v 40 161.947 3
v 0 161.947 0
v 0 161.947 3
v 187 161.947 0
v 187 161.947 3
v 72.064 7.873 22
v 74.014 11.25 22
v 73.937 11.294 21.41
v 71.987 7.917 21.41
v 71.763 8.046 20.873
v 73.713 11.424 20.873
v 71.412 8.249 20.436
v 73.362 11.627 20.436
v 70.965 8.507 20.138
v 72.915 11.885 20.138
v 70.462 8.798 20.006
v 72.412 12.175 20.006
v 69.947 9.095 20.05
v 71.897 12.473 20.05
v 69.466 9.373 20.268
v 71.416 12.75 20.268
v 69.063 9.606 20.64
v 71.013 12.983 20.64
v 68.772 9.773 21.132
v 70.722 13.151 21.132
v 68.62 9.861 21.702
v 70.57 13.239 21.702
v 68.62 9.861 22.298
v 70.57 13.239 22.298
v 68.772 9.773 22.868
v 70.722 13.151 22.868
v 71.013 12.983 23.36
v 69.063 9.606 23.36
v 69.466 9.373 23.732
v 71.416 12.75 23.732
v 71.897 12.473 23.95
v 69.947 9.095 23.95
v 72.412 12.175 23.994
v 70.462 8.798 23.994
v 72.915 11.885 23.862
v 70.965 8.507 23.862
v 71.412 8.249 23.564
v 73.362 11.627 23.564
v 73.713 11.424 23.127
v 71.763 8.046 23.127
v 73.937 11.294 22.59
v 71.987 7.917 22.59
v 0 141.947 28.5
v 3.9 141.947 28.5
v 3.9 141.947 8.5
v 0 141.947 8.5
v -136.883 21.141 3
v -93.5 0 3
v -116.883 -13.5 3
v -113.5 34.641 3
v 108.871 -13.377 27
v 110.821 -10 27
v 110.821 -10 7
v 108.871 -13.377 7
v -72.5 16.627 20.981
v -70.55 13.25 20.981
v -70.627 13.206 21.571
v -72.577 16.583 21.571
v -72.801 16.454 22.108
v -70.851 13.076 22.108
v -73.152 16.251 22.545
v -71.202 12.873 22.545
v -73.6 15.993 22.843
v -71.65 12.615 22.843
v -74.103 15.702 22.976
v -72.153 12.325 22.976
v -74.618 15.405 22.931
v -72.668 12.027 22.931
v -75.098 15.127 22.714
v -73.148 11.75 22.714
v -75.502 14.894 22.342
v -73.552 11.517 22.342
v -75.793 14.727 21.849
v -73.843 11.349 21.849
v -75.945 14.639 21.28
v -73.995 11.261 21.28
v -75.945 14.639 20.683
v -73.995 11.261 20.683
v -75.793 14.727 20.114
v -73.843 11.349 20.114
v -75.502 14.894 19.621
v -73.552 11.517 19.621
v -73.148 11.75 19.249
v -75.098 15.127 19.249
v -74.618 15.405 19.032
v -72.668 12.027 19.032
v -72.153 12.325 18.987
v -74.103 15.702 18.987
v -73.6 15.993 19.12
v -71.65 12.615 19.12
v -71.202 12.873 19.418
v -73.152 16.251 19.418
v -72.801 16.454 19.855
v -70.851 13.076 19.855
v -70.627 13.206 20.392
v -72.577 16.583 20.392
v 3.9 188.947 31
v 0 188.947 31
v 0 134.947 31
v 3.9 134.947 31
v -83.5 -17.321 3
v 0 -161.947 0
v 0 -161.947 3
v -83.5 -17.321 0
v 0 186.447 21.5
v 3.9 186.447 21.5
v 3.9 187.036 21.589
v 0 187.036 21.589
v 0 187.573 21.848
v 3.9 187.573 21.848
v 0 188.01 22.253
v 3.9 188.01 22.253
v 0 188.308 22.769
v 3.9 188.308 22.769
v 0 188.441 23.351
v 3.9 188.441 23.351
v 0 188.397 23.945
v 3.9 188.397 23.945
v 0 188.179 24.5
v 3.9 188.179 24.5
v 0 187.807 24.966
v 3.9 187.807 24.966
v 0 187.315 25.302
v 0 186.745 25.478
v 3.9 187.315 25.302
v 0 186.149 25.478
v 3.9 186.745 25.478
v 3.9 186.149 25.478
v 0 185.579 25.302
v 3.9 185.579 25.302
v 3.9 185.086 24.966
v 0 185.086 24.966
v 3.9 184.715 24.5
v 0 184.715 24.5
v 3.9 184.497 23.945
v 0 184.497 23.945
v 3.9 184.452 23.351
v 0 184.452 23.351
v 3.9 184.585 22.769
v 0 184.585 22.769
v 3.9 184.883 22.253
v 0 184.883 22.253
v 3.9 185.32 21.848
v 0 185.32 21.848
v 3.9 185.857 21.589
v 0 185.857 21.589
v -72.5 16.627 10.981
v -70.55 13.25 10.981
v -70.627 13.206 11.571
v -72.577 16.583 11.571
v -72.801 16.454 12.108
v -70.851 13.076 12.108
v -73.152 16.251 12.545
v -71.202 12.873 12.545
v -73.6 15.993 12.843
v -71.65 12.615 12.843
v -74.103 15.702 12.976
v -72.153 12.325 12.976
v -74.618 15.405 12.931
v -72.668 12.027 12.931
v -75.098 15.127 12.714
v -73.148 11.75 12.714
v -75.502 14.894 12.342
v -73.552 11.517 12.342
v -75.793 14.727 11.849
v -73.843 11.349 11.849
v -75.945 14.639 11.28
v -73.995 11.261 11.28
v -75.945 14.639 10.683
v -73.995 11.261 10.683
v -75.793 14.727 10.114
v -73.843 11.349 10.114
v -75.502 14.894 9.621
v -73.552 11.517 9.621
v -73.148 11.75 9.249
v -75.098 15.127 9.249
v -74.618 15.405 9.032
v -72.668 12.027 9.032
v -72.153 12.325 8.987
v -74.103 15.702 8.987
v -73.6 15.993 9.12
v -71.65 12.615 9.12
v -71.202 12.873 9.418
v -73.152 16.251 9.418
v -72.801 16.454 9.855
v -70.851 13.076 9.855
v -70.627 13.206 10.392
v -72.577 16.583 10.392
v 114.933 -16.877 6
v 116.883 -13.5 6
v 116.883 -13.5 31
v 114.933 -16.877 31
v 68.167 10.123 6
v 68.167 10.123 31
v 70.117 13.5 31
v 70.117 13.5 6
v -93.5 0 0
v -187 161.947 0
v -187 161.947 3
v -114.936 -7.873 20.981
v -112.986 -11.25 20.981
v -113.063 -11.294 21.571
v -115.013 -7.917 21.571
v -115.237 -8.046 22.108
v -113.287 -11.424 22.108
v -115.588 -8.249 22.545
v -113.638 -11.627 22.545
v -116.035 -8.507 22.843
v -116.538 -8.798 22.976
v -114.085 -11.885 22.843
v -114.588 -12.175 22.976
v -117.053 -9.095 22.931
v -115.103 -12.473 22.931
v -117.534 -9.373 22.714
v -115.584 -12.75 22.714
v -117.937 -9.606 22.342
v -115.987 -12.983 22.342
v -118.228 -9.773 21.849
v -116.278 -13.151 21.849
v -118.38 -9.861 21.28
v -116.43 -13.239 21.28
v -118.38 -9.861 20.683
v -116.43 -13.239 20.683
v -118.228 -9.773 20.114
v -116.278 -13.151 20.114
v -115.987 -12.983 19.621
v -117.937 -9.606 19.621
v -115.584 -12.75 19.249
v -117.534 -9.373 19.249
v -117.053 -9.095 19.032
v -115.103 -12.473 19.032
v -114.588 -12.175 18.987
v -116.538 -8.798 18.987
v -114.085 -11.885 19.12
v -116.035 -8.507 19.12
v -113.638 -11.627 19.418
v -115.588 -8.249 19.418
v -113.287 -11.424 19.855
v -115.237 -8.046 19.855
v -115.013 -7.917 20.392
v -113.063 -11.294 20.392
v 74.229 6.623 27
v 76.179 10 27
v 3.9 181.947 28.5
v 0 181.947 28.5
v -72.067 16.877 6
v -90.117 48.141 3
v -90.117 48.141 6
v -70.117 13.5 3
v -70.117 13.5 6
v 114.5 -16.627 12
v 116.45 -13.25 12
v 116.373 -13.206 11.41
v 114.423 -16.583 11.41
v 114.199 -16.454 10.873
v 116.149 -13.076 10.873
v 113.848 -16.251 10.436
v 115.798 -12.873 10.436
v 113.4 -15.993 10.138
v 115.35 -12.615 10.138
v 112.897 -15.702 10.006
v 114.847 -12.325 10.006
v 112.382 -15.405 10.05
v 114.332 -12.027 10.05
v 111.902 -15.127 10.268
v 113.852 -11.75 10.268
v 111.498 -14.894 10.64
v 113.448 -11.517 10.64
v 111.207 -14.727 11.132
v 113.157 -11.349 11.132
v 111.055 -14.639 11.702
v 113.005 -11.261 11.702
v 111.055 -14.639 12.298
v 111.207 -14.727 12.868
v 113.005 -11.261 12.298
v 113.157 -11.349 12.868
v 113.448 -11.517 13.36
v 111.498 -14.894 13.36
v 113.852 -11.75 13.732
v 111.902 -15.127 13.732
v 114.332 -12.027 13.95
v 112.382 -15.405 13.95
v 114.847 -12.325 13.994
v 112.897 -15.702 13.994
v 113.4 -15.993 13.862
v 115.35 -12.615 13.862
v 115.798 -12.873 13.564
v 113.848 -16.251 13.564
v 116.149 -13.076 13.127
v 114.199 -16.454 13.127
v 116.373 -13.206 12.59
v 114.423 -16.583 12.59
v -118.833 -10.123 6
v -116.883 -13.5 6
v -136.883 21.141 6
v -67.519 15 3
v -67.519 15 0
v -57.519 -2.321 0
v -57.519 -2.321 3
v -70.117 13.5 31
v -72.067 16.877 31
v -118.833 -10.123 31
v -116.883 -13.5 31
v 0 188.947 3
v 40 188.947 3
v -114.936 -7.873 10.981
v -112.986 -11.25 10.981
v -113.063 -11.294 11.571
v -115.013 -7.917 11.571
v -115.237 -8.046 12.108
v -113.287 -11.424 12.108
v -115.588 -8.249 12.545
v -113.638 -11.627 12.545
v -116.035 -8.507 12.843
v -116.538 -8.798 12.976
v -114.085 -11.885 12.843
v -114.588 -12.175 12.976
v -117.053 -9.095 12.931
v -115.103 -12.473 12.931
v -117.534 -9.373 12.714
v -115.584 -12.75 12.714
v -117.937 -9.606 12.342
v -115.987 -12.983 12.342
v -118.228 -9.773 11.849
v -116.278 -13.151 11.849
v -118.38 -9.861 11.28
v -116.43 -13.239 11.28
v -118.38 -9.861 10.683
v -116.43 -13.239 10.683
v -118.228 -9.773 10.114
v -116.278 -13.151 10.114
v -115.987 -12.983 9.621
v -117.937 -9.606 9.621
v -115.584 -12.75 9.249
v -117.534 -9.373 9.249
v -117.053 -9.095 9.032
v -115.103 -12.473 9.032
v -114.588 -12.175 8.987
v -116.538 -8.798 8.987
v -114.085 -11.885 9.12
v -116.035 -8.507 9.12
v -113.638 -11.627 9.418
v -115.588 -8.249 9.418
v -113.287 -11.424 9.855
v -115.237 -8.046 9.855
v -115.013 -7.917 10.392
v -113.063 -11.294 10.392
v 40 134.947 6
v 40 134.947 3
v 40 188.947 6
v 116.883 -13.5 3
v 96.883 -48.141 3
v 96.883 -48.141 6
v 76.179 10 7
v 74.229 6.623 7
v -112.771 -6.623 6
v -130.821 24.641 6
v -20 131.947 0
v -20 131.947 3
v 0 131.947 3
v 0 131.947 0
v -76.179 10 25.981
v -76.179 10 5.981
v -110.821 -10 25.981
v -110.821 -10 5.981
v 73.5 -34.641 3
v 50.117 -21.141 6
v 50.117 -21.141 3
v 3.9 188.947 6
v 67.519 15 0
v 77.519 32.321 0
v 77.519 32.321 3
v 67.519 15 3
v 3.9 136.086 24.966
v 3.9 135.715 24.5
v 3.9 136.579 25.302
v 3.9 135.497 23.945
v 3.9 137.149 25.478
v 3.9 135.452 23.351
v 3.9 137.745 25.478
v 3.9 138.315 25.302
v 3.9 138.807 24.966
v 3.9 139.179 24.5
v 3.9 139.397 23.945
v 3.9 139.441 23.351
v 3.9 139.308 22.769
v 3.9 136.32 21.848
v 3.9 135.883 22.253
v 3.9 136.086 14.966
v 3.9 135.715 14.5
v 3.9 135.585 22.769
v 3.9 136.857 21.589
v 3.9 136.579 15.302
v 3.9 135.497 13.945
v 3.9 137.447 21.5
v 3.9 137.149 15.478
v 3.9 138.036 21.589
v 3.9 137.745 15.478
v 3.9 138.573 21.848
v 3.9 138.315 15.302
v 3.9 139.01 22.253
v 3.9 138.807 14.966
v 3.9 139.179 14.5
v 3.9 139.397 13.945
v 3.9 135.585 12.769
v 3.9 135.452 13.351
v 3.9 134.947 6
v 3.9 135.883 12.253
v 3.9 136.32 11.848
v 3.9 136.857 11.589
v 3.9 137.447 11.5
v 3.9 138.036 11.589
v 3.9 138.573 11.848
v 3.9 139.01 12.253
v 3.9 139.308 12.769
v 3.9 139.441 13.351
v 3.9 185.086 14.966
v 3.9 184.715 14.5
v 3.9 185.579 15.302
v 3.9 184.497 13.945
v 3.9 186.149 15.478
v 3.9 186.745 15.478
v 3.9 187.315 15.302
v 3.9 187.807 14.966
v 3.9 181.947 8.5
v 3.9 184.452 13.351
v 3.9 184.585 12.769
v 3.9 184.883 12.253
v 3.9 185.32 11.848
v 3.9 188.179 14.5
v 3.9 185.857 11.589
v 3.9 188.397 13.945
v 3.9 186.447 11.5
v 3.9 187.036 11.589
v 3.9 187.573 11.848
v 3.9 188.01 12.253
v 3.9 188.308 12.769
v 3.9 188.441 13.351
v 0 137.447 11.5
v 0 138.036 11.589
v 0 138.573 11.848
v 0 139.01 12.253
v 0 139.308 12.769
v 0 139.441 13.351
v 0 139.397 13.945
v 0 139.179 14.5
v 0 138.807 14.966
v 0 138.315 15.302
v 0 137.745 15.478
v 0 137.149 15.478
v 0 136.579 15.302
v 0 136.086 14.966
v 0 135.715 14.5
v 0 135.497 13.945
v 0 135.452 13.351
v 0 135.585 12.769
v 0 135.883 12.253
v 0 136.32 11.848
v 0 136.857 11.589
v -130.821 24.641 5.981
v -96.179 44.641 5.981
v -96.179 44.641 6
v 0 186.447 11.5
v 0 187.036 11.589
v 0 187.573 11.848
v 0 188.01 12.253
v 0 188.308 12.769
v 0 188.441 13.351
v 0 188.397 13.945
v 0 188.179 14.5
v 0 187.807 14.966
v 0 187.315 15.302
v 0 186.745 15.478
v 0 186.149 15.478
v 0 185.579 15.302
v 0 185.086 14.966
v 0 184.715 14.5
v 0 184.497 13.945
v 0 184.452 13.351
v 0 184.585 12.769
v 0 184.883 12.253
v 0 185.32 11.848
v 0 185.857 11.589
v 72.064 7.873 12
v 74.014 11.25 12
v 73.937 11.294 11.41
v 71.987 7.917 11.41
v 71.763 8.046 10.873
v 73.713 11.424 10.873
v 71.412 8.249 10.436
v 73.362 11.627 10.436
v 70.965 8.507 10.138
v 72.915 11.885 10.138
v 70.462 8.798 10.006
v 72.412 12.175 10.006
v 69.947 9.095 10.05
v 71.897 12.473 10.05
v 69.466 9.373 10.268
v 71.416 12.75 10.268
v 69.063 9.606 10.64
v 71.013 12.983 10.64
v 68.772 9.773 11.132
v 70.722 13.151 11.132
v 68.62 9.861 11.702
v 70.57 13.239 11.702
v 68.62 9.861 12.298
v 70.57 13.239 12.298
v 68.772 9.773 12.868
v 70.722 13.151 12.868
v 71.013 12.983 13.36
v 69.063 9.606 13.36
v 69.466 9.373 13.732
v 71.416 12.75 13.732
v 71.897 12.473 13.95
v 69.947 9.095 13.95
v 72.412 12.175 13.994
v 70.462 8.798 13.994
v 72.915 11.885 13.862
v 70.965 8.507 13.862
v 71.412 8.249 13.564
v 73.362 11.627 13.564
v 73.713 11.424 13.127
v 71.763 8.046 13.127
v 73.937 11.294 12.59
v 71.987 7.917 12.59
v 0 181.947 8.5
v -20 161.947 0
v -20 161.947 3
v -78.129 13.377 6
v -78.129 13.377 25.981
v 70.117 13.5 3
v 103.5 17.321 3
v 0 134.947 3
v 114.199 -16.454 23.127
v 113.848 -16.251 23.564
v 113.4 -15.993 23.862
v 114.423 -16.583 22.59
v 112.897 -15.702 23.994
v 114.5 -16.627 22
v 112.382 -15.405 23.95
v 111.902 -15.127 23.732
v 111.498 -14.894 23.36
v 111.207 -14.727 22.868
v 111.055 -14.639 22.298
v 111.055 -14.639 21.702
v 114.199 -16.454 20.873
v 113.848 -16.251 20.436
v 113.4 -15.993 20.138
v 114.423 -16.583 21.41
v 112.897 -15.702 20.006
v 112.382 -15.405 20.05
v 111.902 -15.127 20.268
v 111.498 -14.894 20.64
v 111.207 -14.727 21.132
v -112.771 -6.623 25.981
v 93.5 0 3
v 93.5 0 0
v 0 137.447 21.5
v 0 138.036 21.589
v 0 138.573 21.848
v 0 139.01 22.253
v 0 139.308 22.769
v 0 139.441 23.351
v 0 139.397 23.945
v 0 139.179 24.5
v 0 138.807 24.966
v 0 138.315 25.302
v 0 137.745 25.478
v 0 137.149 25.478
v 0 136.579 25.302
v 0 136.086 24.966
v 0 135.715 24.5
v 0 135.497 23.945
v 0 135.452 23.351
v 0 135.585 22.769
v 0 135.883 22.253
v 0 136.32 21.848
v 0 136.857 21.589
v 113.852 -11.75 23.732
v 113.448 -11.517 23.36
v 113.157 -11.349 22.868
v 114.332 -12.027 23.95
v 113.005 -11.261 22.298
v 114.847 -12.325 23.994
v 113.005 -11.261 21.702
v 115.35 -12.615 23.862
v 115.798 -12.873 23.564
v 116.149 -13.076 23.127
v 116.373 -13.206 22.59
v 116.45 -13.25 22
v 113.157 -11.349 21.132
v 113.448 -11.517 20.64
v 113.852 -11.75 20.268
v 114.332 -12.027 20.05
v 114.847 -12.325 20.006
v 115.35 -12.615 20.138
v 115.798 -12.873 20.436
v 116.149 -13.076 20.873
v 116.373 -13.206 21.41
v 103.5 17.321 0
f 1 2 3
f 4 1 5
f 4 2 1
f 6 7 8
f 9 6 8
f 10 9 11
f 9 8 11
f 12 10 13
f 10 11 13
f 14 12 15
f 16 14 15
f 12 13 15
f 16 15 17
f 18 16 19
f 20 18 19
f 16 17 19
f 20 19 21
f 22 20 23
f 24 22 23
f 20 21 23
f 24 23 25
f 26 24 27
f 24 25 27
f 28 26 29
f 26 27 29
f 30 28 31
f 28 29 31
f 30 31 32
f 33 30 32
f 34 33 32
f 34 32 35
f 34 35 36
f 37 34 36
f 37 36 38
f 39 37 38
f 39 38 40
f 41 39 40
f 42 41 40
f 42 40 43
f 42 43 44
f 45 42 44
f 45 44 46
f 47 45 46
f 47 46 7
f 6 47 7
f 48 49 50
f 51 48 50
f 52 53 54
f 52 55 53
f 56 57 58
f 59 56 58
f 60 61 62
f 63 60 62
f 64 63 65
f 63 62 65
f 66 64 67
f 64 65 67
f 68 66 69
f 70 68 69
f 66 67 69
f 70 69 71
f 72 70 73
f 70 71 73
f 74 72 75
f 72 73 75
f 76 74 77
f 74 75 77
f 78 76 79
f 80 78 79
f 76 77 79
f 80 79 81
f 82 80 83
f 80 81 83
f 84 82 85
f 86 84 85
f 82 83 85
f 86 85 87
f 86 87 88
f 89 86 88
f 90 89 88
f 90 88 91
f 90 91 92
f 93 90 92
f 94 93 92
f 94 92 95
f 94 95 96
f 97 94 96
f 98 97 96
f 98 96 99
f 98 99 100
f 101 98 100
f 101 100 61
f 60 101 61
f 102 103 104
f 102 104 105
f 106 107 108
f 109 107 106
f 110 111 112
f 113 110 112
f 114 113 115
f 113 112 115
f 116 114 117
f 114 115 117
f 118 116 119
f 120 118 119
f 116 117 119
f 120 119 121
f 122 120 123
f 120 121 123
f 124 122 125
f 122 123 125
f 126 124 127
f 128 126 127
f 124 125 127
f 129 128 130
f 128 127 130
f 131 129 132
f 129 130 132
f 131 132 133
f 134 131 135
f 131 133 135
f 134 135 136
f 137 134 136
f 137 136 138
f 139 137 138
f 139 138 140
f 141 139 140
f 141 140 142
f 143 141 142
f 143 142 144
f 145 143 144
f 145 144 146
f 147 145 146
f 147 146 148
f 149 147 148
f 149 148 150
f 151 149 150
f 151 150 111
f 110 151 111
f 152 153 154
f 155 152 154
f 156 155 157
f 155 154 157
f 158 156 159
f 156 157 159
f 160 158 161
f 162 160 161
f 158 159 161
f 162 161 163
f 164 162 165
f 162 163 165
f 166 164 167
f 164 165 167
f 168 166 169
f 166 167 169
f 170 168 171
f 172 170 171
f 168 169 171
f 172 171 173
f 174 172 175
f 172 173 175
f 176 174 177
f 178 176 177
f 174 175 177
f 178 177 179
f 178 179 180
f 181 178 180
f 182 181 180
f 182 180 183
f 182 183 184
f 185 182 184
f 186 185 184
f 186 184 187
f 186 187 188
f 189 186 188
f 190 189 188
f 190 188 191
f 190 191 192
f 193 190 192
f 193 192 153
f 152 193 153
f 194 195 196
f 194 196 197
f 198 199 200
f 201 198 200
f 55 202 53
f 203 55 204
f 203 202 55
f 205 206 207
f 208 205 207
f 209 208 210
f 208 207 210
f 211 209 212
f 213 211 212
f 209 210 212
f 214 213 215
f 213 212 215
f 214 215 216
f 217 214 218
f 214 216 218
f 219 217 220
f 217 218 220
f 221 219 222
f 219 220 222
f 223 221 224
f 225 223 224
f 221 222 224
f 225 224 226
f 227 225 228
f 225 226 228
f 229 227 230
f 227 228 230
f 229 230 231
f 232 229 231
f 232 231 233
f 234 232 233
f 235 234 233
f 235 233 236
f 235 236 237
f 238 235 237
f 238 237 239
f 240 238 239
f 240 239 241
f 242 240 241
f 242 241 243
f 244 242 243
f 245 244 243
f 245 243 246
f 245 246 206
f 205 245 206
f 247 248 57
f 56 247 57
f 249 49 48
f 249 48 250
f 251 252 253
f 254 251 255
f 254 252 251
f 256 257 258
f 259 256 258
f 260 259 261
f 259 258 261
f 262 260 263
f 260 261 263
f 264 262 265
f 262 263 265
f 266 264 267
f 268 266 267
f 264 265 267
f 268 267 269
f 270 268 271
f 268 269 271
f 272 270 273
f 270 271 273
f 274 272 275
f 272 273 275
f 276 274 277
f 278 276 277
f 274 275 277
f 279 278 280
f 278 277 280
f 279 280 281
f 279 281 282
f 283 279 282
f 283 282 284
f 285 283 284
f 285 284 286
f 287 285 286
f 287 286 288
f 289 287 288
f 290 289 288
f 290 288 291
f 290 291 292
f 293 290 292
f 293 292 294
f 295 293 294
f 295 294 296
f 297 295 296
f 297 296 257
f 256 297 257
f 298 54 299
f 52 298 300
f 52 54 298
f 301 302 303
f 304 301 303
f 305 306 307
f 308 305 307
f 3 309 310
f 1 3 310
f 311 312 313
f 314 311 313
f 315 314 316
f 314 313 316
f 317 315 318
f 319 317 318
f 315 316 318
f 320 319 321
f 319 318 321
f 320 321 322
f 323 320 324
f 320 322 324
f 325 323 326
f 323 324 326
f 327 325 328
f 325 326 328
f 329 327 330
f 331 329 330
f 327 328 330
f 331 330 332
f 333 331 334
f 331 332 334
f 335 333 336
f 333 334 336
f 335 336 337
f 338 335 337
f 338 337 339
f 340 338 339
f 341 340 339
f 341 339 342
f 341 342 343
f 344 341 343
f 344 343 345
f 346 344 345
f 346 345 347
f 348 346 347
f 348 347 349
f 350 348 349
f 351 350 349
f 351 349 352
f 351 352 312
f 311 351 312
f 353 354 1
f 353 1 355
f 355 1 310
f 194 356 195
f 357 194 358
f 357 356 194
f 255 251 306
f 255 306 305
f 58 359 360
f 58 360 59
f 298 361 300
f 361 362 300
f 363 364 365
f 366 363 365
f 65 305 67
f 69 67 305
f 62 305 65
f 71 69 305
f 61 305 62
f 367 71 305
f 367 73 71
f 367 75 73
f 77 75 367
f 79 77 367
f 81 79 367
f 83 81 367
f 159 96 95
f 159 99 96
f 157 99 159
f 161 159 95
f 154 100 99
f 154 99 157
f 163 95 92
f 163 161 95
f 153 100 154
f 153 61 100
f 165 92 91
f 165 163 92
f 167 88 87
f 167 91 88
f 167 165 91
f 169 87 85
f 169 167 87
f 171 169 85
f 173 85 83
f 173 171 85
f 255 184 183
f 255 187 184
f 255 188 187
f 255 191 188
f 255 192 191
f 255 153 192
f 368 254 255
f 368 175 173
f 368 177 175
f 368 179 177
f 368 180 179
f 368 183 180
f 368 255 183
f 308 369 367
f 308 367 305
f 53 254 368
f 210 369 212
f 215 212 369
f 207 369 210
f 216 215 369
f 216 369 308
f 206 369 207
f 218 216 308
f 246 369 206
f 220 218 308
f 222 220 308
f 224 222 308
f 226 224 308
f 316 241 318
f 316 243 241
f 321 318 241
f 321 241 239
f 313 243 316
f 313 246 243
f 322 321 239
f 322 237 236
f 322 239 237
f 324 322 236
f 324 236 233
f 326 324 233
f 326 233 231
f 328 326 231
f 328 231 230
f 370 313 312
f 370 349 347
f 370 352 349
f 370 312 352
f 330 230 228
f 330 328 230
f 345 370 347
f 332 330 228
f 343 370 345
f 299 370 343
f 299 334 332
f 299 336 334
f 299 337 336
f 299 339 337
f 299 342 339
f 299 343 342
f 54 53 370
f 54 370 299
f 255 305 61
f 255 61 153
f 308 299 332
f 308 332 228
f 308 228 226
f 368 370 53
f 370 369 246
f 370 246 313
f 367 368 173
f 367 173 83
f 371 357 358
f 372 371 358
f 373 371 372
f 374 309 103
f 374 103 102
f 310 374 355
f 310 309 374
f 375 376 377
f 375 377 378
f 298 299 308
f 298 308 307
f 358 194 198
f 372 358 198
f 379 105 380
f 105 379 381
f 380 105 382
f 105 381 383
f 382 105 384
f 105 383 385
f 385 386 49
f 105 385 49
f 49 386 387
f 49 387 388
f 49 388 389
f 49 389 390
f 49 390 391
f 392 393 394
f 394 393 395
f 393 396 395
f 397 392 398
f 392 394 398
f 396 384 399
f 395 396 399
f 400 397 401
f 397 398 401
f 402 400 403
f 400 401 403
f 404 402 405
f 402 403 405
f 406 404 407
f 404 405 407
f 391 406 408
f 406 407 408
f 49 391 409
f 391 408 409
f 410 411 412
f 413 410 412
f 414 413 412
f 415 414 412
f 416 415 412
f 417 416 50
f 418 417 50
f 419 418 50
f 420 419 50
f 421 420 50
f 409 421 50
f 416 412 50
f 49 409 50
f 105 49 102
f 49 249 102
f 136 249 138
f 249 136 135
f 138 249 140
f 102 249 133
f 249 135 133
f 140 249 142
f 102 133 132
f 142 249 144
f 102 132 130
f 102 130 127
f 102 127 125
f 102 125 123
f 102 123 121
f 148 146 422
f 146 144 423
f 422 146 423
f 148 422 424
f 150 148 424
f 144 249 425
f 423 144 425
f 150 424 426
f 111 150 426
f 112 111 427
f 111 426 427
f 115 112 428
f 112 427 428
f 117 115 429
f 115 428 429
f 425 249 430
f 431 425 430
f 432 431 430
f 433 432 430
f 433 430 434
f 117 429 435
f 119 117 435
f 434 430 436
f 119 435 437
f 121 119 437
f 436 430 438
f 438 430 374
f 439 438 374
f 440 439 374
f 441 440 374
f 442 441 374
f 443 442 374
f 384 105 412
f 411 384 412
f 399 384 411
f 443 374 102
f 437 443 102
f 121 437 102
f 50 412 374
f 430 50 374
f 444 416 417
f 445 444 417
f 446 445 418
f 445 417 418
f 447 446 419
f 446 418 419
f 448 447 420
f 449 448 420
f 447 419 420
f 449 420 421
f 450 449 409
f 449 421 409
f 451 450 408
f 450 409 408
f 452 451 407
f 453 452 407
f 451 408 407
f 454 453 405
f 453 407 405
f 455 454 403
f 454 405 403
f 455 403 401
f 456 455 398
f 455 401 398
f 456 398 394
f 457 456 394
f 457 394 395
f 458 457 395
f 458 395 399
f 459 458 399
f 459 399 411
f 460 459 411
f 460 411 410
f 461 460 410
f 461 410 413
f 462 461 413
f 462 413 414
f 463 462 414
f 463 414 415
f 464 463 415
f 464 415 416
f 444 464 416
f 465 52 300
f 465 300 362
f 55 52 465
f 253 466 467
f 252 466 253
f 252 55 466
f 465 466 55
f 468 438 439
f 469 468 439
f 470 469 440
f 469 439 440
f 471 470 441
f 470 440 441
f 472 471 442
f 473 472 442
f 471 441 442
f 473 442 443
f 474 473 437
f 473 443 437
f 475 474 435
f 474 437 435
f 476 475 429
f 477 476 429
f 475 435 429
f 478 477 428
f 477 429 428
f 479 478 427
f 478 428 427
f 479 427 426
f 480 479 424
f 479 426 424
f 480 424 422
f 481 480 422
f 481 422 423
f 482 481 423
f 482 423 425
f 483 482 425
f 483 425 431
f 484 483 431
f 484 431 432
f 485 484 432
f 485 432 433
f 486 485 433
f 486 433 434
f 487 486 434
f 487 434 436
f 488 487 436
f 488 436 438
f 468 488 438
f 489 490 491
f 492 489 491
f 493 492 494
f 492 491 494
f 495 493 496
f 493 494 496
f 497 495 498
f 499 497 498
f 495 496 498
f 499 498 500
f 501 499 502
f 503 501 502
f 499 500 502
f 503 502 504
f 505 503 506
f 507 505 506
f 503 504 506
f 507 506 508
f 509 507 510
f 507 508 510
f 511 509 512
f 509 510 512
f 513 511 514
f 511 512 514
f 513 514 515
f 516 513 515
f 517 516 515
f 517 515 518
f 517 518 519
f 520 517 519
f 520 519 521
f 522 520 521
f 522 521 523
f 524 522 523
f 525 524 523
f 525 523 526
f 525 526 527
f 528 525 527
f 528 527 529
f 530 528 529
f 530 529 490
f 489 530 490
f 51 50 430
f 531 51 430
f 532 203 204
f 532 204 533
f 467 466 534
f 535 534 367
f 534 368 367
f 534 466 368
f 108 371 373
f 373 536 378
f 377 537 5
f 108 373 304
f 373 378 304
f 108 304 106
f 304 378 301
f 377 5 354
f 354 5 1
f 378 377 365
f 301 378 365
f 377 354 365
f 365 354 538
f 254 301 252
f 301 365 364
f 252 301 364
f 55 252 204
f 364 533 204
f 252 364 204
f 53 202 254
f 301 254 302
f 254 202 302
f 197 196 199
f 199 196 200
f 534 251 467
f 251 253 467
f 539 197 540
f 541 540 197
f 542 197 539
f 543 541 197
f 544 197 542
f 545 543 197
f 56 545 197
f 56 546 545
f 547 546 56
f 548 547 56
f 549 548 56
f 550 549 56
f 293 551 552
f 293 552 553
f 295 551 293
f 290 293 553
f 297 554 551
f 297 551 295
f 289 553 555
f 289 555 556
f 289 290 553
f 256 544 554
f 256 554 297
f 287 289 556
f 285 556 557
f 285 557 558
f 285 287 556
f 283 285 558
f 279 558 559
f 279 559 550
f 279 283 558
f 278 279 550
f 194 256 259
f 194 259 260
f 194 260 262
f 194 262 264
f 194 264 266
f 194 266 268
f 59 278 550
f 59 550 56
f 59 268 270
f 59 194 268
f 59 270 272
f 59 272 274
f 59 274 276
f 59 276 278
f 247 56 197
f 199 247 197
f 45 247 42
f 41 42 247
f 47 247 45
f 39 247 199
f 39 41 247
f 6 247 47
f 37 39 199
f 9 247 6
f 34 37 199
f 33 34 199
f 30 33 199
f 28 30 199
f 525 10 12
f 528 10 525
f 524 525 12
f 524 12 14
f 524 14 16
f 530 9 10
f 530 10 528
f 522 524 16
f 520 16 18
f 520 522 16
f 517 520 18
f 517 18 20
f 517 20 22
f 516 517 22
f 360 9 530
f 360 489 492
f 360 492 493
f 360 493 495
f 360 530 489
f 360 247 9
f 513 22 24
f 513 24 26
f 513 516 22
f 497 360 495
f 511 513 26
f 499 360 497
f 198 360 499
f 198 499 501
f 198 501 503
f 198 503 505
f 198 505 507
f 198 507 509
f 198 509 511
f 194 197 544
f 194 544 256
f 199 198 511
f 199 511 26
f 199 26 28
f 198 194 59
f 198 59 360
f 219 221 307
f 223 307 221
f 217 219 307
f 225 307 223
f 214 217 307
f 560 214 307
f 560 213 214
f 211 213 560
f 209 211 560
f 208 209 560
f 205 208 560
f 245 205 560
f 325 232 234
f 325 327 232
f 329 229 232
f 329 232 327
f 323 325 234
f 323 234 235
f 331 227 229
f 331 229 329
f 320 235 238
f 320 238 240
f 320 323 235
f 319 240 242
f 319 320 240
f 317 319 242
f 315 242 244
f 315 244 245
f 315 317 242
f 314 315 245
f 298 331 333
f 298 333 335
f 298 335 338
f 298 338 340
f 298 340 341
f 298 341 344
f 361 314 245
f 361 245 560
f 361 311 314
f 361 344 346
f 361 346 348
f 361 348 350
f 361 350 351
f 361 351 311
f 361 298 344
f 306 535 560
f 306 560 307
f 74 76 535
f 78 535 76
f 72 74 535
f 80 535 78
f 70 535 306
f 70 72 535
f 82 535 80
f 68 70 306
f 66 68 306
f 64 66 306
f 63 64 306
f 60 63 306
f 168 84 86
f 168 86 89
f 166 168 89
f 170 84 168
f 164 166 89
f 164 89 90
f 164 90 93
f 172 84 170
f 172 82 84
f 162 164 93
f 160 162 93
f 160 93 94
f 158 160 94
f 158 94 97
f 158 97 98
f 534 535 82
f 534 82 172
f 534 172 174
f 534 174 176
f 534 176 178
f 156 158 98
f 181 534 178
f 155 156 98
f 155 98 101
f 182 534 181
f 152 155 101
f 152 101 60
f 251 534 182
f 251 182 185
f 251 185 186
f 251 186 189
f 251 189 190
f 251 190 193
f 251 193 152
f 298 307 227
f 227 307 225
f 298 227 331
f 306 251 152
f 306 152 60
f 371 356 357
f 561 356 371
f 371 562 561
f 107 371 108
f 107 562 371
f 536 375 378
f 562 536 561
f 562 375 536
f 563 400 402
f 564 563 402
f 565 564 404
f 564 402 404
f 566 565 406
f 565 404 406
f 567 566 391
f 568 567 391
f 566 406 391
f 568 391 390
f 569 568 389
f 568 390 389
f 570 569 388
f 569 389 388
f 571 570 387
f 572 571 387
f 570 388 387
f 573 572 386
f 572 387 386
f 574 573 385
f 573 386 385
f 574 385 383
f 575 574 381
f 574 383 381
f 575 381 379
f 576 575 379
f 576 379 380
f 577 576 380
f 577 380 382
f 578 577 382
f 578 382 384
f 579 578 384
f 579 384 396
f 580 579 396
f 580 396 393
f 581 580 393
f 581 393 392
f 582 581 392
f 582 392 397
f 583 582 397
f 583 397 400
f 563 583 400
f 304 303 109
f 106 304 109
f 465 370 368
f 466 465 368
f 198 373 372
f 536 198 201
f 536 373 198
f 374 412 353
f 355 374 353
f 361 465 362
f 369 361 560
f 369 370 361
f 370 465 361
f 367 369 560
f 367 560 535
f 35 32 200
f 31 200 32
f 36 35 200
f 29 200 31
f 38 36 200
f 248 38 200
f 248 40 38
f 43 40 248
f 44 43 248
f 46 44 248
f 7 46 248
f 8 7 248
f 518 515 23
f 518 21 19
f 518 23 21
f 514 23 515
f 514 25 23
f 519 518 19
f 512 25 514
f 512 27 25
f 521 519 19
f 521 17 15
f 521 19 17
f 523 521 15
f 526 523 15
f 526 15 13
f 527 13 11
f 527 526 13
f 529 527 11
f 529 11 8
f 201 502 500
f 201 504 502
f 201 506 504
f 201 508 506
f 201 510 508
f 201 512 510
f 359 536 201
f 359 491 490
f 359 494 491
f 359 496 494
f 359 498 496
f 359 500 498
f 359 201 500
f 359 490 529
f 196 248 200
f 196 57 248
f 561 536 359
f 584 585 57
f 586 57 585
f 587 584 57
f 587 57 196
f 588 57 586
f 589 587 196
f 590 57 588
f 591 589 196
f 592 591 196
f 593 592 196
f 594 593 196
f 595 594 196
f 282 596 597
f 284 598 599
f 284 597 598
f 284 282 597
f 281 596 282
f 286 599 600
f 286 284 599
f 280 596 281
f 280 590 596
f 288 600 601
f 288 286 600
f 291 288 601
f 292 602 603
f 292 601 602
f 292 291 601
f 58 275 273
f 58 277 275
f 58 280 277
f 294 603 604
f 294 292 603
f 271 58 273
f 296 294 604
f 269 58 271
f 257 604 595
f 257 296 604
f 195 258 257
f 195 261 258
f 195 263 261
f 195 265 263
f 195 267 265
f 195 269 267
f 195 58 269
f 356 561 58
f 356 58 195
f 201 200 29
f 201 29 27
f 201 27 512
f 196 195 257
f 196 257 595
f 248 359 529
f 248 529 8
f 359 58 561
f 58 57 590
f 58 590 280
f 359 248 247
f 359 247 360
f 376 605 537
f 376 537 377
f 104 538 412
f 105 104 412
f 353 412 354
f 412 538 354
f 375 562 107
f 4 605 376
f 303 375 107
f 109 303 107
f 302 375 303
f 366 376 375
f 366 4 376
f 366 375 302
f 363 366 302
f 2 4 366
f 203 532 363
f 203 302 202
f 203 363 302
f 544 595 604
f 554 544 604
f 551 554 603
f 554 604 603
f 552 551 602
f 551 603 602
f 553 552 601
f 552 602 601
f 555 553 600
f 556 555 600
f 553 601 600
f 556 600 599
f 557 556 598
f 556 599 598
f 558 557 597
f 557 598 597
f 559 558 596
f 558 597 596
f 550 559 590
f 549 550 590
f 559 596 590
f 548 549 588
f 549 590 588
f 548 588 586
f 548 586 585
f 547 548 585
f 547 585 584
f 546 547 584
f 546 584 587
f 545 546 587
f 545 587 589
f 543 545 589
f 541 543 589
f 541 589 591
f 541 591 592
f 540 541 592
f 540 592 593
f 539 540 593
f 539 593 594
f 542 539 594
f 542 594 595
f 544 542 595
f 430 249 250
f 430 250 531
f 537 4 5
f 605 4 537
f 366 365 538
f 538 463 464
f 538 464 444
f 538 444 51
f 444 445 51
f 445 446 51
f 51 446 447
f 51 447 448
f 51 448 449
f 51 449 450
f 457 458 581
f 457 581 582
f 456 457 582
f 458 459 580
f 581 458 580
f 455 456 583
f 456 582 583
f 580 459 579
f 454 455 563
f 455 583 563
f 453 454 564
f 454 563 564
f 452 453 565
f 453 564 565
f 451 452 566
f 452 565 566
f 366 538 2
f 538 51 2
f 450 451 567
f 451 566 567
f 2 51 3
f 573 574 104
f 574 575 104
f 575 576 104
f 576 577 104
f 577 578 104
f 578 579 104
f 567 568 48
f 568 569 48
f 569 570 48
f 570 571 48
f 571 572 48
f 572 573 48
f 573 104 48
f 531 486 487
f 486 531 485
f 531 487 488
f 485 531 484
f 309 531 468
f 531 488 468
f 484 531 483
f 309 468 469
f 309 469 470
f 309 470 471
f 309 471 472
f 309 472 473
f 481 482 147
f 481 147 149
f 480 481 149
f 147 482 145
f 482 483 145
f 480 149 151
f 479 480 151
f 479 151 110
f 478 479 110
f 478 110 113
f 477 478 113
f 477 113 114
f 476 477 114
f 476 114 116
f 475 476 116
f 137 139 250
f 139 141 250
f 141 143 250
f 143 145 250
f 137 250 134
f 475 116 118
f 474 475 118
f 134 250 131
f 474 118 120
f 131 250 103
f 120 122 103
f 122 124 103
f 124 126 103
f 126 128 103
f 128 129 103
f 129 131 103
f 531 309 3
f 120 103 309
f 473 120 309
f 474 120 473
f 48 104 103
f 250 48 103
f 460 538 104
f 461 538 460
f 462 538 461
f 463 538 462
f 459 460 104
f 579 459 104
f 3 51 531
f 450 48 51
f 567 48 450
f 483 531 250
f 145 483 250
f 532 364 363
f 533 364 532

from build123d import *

# Parameters (mm, degrees)
BOSS_EXTRUDE1_DEPTH     = 3
SKETCH4_W               = 40
SKETCH4_H               = 54
BOSS_EXTRUDE2_DEPTH     = 3
SKETCH11_W              = 3.9
SKETCH11_H              = 54
BOSS_EXTRUDE3_DEPTH     = 25
SKETCH16_R              = 2
SKETCH16_W              = 20
SKETCH16_H              = 40
CUT_EXTRUDE2_DEPTH      = 184.1
CUT_EXTRUDE2_DEPTH_BACK = 191.9
SKETCH13_R              = 2
SKETCH13_W              = 40
SKETCH13_H              = 20
CUT_EXTRUDE3_DEPTH      = 211.382685902
CUT_EXTRUDE3_DEPTH_BACK = 281.5
SKETCH12_R              = 2
SKETCH12_W              = 40
SKETCH12_H              = 20
CUT_EXTRUDE4_DEPTH      = 281.5
CUT_EXTRUDE4_DEPTH_BACK = 211.382685902
SKETCH17_W              = 20
SKETCH17_H              = 30
CUT_EXTRUDE5_DEPTH      = 80


with BuildPart() as part:
    # Sketch2 → Boss-Extrude1 (new body)
    with BuildSketch(Plane.XY):
        Polygon((-187, 161.946750508), (187, 161.946750508), (0, -161.946750508), align=None)
    extrude(amount=BOSS_EXTRUDE1_DEPTH)

    # Sketch4 → Boss-Extrude2 (add)
    with BuildSketch(Plane.XY.offset(3)):
        Polygon((116.882685902, -13.5), (96.882685902, -48.141016151), (50.117314098, -21.141016151), (70.117314098, 13.5), align=None)
        Polygon((-116.882685902, -13.5), (-136.882685902, 21.141016151), (-90.117314098, 48.141016151), (-70.117314098, 13.5), align=None)
        with Locations((20, 161.946750508)):
            Rectangle(SKETCH4_W, SKETCH4_H)
    extrude(amount=BOSS_EXTRUDE2_DEPTH)

    # Sketch11 → Boss-Extrude3 (add)
    with BuildSketch(Plane.XY.offset(6)):
        Polygon((116.882685902, -13.5), (114.932685902, -16.877499075), (68.167314098, 10.122500925), (70.117314098, 13.5), align=None)
        Polygon((-116.882685902, -13.5), (-118.832685902, -10.122500925), (-72.067314098, 16.877499075), (-70.117314098, 13.5), align=None)
        with Locations((1.95, 161.946750508)):
            Rectangle(SKETCH11_W, SKETCH11_H)
    extrude(amount=BOSS_EXTRUDE3_DEPTH)

    # Sketch16 → Cut-Extrude2 (cut, two sides)
    with BuildSketch(Plane(origin=(3.9, 0, 0), x_dir=(0, 0, -1), z_dir=(1, 0, 0))) as cut_extrude2_sk:
        with Locations((-13.5, 186.446750508)):
            Circle(SKETCH16_R)
        with Locations((-23.5, 186.446750508)):
            Circle(SKETCH16_R)
        with Locations((-23.5, 137.446750508)):
            Circle(SKETCH16_R)
        with Locations((-13.5, 137.446750508)):
            Circle(SKETCH16_R)
        with Locations((-18.5, 161.946750508)):
            Rectangle(SKETCH16_W, SKETCH16_H)
    extrude(amount=CUT_EXTRUDE2_DEPTH, mode=Mode.SUBTRACT)
    extrude(cut_extrude2_sk.sketch, amount=-CUT_EXTRUDE2_DEPTH_BACK, mode=Mode.SUBTRACT)

    # Sketch13 → Cut-Extrude3 (cut, two sides)
    with BuildSketch(Plane(origin=(23.375, 40.486687627, 0), x_dir=(0.866025404, -0.5, 0), z_dir=(0.5, 0.866025404, 0))) as cut_extrude3_sk:
        with Locations((105.473375254, -22)):
            Circle(SKETCH13_R)
        with Locations((105.473375254, -12)):
            Circle(SKETCH13_R)
        with Locations((56.473375254, -12)):
            Circle(SKETCH13_R)
        with Locations((56.473375254, -22)):
            Circle(SKETCH13_R)
        with Locations((80.973375254, -17)):
            Rectangle(SKETCH13_W, SKETCH13_H)
    extrude(amount=CUT_EXTRUDE3_DEPTH, mode=Mode.SUBTRACT)
    extrude(cut_extrude3_sk.sketch, amount=-CUT_EXTRUDE3_DEPTH_BACK, mode=Mode.SUBTRACT)

    # Sketch12 → Cut-Extrude4 (cut, two sides)
    with BuildSketch(Plane(origin=(-23.375, 40.486687627, 0), x_dir=(0.866025404, 0.5, 0), z_dir=(0.5, -0.866025404, 0))) as cut_extrude4_sk:
        with Locations((-56.473375254, 10.981481481)):
            Circle(SKETCH12_R)
        with Locations((-56.473375254, 20.981481481)):
            Circle(SKETCH12_R)
        with Locations((-105.473375254, 20.981481481)):
            Circle(SKETCH12_R)
        with Locations((-105.473375254, 10.981481481)):
            Circle(SKETCH12_R)
        with Locations((-80.973375254, 15.981481481)):
            Rectangle(SKETCH12_W, SKETCH12_H)
    extrude(amount=CUT_EXTRUDE4_DEPTH, mode=Mode.SUBTRACT)
    extrude(cut_extrude4_sk.sketch, amount=-CUT_EXTRUDE4_DEPTH_BACK, mode=Mode.SUBTRACT)

    # Sketch17 → Cut-Extrude5 (cut, symmetric)
    with BuildSketch(Plane.XY.offset(3)):
        Polygon((-93.5, 0), (-67.519237886, 15), (-57.519237886, -2.320508076), (-83.5, -17.320508076), align=None)
        Polygon((93.5, 0), (103.5, 17.320508076), (77.519237886, 32.320508076), (67.519237886, 15), align=None)
        with Locations((-10, 146.946750508)):
            Rectangle(SKETCH17_W, SKETCH17_H)
    extrude(amount=CUT_EXTRUDE5_DEPTH, both=True, mode=Mode.SUBTRACT)


solid = part.part
